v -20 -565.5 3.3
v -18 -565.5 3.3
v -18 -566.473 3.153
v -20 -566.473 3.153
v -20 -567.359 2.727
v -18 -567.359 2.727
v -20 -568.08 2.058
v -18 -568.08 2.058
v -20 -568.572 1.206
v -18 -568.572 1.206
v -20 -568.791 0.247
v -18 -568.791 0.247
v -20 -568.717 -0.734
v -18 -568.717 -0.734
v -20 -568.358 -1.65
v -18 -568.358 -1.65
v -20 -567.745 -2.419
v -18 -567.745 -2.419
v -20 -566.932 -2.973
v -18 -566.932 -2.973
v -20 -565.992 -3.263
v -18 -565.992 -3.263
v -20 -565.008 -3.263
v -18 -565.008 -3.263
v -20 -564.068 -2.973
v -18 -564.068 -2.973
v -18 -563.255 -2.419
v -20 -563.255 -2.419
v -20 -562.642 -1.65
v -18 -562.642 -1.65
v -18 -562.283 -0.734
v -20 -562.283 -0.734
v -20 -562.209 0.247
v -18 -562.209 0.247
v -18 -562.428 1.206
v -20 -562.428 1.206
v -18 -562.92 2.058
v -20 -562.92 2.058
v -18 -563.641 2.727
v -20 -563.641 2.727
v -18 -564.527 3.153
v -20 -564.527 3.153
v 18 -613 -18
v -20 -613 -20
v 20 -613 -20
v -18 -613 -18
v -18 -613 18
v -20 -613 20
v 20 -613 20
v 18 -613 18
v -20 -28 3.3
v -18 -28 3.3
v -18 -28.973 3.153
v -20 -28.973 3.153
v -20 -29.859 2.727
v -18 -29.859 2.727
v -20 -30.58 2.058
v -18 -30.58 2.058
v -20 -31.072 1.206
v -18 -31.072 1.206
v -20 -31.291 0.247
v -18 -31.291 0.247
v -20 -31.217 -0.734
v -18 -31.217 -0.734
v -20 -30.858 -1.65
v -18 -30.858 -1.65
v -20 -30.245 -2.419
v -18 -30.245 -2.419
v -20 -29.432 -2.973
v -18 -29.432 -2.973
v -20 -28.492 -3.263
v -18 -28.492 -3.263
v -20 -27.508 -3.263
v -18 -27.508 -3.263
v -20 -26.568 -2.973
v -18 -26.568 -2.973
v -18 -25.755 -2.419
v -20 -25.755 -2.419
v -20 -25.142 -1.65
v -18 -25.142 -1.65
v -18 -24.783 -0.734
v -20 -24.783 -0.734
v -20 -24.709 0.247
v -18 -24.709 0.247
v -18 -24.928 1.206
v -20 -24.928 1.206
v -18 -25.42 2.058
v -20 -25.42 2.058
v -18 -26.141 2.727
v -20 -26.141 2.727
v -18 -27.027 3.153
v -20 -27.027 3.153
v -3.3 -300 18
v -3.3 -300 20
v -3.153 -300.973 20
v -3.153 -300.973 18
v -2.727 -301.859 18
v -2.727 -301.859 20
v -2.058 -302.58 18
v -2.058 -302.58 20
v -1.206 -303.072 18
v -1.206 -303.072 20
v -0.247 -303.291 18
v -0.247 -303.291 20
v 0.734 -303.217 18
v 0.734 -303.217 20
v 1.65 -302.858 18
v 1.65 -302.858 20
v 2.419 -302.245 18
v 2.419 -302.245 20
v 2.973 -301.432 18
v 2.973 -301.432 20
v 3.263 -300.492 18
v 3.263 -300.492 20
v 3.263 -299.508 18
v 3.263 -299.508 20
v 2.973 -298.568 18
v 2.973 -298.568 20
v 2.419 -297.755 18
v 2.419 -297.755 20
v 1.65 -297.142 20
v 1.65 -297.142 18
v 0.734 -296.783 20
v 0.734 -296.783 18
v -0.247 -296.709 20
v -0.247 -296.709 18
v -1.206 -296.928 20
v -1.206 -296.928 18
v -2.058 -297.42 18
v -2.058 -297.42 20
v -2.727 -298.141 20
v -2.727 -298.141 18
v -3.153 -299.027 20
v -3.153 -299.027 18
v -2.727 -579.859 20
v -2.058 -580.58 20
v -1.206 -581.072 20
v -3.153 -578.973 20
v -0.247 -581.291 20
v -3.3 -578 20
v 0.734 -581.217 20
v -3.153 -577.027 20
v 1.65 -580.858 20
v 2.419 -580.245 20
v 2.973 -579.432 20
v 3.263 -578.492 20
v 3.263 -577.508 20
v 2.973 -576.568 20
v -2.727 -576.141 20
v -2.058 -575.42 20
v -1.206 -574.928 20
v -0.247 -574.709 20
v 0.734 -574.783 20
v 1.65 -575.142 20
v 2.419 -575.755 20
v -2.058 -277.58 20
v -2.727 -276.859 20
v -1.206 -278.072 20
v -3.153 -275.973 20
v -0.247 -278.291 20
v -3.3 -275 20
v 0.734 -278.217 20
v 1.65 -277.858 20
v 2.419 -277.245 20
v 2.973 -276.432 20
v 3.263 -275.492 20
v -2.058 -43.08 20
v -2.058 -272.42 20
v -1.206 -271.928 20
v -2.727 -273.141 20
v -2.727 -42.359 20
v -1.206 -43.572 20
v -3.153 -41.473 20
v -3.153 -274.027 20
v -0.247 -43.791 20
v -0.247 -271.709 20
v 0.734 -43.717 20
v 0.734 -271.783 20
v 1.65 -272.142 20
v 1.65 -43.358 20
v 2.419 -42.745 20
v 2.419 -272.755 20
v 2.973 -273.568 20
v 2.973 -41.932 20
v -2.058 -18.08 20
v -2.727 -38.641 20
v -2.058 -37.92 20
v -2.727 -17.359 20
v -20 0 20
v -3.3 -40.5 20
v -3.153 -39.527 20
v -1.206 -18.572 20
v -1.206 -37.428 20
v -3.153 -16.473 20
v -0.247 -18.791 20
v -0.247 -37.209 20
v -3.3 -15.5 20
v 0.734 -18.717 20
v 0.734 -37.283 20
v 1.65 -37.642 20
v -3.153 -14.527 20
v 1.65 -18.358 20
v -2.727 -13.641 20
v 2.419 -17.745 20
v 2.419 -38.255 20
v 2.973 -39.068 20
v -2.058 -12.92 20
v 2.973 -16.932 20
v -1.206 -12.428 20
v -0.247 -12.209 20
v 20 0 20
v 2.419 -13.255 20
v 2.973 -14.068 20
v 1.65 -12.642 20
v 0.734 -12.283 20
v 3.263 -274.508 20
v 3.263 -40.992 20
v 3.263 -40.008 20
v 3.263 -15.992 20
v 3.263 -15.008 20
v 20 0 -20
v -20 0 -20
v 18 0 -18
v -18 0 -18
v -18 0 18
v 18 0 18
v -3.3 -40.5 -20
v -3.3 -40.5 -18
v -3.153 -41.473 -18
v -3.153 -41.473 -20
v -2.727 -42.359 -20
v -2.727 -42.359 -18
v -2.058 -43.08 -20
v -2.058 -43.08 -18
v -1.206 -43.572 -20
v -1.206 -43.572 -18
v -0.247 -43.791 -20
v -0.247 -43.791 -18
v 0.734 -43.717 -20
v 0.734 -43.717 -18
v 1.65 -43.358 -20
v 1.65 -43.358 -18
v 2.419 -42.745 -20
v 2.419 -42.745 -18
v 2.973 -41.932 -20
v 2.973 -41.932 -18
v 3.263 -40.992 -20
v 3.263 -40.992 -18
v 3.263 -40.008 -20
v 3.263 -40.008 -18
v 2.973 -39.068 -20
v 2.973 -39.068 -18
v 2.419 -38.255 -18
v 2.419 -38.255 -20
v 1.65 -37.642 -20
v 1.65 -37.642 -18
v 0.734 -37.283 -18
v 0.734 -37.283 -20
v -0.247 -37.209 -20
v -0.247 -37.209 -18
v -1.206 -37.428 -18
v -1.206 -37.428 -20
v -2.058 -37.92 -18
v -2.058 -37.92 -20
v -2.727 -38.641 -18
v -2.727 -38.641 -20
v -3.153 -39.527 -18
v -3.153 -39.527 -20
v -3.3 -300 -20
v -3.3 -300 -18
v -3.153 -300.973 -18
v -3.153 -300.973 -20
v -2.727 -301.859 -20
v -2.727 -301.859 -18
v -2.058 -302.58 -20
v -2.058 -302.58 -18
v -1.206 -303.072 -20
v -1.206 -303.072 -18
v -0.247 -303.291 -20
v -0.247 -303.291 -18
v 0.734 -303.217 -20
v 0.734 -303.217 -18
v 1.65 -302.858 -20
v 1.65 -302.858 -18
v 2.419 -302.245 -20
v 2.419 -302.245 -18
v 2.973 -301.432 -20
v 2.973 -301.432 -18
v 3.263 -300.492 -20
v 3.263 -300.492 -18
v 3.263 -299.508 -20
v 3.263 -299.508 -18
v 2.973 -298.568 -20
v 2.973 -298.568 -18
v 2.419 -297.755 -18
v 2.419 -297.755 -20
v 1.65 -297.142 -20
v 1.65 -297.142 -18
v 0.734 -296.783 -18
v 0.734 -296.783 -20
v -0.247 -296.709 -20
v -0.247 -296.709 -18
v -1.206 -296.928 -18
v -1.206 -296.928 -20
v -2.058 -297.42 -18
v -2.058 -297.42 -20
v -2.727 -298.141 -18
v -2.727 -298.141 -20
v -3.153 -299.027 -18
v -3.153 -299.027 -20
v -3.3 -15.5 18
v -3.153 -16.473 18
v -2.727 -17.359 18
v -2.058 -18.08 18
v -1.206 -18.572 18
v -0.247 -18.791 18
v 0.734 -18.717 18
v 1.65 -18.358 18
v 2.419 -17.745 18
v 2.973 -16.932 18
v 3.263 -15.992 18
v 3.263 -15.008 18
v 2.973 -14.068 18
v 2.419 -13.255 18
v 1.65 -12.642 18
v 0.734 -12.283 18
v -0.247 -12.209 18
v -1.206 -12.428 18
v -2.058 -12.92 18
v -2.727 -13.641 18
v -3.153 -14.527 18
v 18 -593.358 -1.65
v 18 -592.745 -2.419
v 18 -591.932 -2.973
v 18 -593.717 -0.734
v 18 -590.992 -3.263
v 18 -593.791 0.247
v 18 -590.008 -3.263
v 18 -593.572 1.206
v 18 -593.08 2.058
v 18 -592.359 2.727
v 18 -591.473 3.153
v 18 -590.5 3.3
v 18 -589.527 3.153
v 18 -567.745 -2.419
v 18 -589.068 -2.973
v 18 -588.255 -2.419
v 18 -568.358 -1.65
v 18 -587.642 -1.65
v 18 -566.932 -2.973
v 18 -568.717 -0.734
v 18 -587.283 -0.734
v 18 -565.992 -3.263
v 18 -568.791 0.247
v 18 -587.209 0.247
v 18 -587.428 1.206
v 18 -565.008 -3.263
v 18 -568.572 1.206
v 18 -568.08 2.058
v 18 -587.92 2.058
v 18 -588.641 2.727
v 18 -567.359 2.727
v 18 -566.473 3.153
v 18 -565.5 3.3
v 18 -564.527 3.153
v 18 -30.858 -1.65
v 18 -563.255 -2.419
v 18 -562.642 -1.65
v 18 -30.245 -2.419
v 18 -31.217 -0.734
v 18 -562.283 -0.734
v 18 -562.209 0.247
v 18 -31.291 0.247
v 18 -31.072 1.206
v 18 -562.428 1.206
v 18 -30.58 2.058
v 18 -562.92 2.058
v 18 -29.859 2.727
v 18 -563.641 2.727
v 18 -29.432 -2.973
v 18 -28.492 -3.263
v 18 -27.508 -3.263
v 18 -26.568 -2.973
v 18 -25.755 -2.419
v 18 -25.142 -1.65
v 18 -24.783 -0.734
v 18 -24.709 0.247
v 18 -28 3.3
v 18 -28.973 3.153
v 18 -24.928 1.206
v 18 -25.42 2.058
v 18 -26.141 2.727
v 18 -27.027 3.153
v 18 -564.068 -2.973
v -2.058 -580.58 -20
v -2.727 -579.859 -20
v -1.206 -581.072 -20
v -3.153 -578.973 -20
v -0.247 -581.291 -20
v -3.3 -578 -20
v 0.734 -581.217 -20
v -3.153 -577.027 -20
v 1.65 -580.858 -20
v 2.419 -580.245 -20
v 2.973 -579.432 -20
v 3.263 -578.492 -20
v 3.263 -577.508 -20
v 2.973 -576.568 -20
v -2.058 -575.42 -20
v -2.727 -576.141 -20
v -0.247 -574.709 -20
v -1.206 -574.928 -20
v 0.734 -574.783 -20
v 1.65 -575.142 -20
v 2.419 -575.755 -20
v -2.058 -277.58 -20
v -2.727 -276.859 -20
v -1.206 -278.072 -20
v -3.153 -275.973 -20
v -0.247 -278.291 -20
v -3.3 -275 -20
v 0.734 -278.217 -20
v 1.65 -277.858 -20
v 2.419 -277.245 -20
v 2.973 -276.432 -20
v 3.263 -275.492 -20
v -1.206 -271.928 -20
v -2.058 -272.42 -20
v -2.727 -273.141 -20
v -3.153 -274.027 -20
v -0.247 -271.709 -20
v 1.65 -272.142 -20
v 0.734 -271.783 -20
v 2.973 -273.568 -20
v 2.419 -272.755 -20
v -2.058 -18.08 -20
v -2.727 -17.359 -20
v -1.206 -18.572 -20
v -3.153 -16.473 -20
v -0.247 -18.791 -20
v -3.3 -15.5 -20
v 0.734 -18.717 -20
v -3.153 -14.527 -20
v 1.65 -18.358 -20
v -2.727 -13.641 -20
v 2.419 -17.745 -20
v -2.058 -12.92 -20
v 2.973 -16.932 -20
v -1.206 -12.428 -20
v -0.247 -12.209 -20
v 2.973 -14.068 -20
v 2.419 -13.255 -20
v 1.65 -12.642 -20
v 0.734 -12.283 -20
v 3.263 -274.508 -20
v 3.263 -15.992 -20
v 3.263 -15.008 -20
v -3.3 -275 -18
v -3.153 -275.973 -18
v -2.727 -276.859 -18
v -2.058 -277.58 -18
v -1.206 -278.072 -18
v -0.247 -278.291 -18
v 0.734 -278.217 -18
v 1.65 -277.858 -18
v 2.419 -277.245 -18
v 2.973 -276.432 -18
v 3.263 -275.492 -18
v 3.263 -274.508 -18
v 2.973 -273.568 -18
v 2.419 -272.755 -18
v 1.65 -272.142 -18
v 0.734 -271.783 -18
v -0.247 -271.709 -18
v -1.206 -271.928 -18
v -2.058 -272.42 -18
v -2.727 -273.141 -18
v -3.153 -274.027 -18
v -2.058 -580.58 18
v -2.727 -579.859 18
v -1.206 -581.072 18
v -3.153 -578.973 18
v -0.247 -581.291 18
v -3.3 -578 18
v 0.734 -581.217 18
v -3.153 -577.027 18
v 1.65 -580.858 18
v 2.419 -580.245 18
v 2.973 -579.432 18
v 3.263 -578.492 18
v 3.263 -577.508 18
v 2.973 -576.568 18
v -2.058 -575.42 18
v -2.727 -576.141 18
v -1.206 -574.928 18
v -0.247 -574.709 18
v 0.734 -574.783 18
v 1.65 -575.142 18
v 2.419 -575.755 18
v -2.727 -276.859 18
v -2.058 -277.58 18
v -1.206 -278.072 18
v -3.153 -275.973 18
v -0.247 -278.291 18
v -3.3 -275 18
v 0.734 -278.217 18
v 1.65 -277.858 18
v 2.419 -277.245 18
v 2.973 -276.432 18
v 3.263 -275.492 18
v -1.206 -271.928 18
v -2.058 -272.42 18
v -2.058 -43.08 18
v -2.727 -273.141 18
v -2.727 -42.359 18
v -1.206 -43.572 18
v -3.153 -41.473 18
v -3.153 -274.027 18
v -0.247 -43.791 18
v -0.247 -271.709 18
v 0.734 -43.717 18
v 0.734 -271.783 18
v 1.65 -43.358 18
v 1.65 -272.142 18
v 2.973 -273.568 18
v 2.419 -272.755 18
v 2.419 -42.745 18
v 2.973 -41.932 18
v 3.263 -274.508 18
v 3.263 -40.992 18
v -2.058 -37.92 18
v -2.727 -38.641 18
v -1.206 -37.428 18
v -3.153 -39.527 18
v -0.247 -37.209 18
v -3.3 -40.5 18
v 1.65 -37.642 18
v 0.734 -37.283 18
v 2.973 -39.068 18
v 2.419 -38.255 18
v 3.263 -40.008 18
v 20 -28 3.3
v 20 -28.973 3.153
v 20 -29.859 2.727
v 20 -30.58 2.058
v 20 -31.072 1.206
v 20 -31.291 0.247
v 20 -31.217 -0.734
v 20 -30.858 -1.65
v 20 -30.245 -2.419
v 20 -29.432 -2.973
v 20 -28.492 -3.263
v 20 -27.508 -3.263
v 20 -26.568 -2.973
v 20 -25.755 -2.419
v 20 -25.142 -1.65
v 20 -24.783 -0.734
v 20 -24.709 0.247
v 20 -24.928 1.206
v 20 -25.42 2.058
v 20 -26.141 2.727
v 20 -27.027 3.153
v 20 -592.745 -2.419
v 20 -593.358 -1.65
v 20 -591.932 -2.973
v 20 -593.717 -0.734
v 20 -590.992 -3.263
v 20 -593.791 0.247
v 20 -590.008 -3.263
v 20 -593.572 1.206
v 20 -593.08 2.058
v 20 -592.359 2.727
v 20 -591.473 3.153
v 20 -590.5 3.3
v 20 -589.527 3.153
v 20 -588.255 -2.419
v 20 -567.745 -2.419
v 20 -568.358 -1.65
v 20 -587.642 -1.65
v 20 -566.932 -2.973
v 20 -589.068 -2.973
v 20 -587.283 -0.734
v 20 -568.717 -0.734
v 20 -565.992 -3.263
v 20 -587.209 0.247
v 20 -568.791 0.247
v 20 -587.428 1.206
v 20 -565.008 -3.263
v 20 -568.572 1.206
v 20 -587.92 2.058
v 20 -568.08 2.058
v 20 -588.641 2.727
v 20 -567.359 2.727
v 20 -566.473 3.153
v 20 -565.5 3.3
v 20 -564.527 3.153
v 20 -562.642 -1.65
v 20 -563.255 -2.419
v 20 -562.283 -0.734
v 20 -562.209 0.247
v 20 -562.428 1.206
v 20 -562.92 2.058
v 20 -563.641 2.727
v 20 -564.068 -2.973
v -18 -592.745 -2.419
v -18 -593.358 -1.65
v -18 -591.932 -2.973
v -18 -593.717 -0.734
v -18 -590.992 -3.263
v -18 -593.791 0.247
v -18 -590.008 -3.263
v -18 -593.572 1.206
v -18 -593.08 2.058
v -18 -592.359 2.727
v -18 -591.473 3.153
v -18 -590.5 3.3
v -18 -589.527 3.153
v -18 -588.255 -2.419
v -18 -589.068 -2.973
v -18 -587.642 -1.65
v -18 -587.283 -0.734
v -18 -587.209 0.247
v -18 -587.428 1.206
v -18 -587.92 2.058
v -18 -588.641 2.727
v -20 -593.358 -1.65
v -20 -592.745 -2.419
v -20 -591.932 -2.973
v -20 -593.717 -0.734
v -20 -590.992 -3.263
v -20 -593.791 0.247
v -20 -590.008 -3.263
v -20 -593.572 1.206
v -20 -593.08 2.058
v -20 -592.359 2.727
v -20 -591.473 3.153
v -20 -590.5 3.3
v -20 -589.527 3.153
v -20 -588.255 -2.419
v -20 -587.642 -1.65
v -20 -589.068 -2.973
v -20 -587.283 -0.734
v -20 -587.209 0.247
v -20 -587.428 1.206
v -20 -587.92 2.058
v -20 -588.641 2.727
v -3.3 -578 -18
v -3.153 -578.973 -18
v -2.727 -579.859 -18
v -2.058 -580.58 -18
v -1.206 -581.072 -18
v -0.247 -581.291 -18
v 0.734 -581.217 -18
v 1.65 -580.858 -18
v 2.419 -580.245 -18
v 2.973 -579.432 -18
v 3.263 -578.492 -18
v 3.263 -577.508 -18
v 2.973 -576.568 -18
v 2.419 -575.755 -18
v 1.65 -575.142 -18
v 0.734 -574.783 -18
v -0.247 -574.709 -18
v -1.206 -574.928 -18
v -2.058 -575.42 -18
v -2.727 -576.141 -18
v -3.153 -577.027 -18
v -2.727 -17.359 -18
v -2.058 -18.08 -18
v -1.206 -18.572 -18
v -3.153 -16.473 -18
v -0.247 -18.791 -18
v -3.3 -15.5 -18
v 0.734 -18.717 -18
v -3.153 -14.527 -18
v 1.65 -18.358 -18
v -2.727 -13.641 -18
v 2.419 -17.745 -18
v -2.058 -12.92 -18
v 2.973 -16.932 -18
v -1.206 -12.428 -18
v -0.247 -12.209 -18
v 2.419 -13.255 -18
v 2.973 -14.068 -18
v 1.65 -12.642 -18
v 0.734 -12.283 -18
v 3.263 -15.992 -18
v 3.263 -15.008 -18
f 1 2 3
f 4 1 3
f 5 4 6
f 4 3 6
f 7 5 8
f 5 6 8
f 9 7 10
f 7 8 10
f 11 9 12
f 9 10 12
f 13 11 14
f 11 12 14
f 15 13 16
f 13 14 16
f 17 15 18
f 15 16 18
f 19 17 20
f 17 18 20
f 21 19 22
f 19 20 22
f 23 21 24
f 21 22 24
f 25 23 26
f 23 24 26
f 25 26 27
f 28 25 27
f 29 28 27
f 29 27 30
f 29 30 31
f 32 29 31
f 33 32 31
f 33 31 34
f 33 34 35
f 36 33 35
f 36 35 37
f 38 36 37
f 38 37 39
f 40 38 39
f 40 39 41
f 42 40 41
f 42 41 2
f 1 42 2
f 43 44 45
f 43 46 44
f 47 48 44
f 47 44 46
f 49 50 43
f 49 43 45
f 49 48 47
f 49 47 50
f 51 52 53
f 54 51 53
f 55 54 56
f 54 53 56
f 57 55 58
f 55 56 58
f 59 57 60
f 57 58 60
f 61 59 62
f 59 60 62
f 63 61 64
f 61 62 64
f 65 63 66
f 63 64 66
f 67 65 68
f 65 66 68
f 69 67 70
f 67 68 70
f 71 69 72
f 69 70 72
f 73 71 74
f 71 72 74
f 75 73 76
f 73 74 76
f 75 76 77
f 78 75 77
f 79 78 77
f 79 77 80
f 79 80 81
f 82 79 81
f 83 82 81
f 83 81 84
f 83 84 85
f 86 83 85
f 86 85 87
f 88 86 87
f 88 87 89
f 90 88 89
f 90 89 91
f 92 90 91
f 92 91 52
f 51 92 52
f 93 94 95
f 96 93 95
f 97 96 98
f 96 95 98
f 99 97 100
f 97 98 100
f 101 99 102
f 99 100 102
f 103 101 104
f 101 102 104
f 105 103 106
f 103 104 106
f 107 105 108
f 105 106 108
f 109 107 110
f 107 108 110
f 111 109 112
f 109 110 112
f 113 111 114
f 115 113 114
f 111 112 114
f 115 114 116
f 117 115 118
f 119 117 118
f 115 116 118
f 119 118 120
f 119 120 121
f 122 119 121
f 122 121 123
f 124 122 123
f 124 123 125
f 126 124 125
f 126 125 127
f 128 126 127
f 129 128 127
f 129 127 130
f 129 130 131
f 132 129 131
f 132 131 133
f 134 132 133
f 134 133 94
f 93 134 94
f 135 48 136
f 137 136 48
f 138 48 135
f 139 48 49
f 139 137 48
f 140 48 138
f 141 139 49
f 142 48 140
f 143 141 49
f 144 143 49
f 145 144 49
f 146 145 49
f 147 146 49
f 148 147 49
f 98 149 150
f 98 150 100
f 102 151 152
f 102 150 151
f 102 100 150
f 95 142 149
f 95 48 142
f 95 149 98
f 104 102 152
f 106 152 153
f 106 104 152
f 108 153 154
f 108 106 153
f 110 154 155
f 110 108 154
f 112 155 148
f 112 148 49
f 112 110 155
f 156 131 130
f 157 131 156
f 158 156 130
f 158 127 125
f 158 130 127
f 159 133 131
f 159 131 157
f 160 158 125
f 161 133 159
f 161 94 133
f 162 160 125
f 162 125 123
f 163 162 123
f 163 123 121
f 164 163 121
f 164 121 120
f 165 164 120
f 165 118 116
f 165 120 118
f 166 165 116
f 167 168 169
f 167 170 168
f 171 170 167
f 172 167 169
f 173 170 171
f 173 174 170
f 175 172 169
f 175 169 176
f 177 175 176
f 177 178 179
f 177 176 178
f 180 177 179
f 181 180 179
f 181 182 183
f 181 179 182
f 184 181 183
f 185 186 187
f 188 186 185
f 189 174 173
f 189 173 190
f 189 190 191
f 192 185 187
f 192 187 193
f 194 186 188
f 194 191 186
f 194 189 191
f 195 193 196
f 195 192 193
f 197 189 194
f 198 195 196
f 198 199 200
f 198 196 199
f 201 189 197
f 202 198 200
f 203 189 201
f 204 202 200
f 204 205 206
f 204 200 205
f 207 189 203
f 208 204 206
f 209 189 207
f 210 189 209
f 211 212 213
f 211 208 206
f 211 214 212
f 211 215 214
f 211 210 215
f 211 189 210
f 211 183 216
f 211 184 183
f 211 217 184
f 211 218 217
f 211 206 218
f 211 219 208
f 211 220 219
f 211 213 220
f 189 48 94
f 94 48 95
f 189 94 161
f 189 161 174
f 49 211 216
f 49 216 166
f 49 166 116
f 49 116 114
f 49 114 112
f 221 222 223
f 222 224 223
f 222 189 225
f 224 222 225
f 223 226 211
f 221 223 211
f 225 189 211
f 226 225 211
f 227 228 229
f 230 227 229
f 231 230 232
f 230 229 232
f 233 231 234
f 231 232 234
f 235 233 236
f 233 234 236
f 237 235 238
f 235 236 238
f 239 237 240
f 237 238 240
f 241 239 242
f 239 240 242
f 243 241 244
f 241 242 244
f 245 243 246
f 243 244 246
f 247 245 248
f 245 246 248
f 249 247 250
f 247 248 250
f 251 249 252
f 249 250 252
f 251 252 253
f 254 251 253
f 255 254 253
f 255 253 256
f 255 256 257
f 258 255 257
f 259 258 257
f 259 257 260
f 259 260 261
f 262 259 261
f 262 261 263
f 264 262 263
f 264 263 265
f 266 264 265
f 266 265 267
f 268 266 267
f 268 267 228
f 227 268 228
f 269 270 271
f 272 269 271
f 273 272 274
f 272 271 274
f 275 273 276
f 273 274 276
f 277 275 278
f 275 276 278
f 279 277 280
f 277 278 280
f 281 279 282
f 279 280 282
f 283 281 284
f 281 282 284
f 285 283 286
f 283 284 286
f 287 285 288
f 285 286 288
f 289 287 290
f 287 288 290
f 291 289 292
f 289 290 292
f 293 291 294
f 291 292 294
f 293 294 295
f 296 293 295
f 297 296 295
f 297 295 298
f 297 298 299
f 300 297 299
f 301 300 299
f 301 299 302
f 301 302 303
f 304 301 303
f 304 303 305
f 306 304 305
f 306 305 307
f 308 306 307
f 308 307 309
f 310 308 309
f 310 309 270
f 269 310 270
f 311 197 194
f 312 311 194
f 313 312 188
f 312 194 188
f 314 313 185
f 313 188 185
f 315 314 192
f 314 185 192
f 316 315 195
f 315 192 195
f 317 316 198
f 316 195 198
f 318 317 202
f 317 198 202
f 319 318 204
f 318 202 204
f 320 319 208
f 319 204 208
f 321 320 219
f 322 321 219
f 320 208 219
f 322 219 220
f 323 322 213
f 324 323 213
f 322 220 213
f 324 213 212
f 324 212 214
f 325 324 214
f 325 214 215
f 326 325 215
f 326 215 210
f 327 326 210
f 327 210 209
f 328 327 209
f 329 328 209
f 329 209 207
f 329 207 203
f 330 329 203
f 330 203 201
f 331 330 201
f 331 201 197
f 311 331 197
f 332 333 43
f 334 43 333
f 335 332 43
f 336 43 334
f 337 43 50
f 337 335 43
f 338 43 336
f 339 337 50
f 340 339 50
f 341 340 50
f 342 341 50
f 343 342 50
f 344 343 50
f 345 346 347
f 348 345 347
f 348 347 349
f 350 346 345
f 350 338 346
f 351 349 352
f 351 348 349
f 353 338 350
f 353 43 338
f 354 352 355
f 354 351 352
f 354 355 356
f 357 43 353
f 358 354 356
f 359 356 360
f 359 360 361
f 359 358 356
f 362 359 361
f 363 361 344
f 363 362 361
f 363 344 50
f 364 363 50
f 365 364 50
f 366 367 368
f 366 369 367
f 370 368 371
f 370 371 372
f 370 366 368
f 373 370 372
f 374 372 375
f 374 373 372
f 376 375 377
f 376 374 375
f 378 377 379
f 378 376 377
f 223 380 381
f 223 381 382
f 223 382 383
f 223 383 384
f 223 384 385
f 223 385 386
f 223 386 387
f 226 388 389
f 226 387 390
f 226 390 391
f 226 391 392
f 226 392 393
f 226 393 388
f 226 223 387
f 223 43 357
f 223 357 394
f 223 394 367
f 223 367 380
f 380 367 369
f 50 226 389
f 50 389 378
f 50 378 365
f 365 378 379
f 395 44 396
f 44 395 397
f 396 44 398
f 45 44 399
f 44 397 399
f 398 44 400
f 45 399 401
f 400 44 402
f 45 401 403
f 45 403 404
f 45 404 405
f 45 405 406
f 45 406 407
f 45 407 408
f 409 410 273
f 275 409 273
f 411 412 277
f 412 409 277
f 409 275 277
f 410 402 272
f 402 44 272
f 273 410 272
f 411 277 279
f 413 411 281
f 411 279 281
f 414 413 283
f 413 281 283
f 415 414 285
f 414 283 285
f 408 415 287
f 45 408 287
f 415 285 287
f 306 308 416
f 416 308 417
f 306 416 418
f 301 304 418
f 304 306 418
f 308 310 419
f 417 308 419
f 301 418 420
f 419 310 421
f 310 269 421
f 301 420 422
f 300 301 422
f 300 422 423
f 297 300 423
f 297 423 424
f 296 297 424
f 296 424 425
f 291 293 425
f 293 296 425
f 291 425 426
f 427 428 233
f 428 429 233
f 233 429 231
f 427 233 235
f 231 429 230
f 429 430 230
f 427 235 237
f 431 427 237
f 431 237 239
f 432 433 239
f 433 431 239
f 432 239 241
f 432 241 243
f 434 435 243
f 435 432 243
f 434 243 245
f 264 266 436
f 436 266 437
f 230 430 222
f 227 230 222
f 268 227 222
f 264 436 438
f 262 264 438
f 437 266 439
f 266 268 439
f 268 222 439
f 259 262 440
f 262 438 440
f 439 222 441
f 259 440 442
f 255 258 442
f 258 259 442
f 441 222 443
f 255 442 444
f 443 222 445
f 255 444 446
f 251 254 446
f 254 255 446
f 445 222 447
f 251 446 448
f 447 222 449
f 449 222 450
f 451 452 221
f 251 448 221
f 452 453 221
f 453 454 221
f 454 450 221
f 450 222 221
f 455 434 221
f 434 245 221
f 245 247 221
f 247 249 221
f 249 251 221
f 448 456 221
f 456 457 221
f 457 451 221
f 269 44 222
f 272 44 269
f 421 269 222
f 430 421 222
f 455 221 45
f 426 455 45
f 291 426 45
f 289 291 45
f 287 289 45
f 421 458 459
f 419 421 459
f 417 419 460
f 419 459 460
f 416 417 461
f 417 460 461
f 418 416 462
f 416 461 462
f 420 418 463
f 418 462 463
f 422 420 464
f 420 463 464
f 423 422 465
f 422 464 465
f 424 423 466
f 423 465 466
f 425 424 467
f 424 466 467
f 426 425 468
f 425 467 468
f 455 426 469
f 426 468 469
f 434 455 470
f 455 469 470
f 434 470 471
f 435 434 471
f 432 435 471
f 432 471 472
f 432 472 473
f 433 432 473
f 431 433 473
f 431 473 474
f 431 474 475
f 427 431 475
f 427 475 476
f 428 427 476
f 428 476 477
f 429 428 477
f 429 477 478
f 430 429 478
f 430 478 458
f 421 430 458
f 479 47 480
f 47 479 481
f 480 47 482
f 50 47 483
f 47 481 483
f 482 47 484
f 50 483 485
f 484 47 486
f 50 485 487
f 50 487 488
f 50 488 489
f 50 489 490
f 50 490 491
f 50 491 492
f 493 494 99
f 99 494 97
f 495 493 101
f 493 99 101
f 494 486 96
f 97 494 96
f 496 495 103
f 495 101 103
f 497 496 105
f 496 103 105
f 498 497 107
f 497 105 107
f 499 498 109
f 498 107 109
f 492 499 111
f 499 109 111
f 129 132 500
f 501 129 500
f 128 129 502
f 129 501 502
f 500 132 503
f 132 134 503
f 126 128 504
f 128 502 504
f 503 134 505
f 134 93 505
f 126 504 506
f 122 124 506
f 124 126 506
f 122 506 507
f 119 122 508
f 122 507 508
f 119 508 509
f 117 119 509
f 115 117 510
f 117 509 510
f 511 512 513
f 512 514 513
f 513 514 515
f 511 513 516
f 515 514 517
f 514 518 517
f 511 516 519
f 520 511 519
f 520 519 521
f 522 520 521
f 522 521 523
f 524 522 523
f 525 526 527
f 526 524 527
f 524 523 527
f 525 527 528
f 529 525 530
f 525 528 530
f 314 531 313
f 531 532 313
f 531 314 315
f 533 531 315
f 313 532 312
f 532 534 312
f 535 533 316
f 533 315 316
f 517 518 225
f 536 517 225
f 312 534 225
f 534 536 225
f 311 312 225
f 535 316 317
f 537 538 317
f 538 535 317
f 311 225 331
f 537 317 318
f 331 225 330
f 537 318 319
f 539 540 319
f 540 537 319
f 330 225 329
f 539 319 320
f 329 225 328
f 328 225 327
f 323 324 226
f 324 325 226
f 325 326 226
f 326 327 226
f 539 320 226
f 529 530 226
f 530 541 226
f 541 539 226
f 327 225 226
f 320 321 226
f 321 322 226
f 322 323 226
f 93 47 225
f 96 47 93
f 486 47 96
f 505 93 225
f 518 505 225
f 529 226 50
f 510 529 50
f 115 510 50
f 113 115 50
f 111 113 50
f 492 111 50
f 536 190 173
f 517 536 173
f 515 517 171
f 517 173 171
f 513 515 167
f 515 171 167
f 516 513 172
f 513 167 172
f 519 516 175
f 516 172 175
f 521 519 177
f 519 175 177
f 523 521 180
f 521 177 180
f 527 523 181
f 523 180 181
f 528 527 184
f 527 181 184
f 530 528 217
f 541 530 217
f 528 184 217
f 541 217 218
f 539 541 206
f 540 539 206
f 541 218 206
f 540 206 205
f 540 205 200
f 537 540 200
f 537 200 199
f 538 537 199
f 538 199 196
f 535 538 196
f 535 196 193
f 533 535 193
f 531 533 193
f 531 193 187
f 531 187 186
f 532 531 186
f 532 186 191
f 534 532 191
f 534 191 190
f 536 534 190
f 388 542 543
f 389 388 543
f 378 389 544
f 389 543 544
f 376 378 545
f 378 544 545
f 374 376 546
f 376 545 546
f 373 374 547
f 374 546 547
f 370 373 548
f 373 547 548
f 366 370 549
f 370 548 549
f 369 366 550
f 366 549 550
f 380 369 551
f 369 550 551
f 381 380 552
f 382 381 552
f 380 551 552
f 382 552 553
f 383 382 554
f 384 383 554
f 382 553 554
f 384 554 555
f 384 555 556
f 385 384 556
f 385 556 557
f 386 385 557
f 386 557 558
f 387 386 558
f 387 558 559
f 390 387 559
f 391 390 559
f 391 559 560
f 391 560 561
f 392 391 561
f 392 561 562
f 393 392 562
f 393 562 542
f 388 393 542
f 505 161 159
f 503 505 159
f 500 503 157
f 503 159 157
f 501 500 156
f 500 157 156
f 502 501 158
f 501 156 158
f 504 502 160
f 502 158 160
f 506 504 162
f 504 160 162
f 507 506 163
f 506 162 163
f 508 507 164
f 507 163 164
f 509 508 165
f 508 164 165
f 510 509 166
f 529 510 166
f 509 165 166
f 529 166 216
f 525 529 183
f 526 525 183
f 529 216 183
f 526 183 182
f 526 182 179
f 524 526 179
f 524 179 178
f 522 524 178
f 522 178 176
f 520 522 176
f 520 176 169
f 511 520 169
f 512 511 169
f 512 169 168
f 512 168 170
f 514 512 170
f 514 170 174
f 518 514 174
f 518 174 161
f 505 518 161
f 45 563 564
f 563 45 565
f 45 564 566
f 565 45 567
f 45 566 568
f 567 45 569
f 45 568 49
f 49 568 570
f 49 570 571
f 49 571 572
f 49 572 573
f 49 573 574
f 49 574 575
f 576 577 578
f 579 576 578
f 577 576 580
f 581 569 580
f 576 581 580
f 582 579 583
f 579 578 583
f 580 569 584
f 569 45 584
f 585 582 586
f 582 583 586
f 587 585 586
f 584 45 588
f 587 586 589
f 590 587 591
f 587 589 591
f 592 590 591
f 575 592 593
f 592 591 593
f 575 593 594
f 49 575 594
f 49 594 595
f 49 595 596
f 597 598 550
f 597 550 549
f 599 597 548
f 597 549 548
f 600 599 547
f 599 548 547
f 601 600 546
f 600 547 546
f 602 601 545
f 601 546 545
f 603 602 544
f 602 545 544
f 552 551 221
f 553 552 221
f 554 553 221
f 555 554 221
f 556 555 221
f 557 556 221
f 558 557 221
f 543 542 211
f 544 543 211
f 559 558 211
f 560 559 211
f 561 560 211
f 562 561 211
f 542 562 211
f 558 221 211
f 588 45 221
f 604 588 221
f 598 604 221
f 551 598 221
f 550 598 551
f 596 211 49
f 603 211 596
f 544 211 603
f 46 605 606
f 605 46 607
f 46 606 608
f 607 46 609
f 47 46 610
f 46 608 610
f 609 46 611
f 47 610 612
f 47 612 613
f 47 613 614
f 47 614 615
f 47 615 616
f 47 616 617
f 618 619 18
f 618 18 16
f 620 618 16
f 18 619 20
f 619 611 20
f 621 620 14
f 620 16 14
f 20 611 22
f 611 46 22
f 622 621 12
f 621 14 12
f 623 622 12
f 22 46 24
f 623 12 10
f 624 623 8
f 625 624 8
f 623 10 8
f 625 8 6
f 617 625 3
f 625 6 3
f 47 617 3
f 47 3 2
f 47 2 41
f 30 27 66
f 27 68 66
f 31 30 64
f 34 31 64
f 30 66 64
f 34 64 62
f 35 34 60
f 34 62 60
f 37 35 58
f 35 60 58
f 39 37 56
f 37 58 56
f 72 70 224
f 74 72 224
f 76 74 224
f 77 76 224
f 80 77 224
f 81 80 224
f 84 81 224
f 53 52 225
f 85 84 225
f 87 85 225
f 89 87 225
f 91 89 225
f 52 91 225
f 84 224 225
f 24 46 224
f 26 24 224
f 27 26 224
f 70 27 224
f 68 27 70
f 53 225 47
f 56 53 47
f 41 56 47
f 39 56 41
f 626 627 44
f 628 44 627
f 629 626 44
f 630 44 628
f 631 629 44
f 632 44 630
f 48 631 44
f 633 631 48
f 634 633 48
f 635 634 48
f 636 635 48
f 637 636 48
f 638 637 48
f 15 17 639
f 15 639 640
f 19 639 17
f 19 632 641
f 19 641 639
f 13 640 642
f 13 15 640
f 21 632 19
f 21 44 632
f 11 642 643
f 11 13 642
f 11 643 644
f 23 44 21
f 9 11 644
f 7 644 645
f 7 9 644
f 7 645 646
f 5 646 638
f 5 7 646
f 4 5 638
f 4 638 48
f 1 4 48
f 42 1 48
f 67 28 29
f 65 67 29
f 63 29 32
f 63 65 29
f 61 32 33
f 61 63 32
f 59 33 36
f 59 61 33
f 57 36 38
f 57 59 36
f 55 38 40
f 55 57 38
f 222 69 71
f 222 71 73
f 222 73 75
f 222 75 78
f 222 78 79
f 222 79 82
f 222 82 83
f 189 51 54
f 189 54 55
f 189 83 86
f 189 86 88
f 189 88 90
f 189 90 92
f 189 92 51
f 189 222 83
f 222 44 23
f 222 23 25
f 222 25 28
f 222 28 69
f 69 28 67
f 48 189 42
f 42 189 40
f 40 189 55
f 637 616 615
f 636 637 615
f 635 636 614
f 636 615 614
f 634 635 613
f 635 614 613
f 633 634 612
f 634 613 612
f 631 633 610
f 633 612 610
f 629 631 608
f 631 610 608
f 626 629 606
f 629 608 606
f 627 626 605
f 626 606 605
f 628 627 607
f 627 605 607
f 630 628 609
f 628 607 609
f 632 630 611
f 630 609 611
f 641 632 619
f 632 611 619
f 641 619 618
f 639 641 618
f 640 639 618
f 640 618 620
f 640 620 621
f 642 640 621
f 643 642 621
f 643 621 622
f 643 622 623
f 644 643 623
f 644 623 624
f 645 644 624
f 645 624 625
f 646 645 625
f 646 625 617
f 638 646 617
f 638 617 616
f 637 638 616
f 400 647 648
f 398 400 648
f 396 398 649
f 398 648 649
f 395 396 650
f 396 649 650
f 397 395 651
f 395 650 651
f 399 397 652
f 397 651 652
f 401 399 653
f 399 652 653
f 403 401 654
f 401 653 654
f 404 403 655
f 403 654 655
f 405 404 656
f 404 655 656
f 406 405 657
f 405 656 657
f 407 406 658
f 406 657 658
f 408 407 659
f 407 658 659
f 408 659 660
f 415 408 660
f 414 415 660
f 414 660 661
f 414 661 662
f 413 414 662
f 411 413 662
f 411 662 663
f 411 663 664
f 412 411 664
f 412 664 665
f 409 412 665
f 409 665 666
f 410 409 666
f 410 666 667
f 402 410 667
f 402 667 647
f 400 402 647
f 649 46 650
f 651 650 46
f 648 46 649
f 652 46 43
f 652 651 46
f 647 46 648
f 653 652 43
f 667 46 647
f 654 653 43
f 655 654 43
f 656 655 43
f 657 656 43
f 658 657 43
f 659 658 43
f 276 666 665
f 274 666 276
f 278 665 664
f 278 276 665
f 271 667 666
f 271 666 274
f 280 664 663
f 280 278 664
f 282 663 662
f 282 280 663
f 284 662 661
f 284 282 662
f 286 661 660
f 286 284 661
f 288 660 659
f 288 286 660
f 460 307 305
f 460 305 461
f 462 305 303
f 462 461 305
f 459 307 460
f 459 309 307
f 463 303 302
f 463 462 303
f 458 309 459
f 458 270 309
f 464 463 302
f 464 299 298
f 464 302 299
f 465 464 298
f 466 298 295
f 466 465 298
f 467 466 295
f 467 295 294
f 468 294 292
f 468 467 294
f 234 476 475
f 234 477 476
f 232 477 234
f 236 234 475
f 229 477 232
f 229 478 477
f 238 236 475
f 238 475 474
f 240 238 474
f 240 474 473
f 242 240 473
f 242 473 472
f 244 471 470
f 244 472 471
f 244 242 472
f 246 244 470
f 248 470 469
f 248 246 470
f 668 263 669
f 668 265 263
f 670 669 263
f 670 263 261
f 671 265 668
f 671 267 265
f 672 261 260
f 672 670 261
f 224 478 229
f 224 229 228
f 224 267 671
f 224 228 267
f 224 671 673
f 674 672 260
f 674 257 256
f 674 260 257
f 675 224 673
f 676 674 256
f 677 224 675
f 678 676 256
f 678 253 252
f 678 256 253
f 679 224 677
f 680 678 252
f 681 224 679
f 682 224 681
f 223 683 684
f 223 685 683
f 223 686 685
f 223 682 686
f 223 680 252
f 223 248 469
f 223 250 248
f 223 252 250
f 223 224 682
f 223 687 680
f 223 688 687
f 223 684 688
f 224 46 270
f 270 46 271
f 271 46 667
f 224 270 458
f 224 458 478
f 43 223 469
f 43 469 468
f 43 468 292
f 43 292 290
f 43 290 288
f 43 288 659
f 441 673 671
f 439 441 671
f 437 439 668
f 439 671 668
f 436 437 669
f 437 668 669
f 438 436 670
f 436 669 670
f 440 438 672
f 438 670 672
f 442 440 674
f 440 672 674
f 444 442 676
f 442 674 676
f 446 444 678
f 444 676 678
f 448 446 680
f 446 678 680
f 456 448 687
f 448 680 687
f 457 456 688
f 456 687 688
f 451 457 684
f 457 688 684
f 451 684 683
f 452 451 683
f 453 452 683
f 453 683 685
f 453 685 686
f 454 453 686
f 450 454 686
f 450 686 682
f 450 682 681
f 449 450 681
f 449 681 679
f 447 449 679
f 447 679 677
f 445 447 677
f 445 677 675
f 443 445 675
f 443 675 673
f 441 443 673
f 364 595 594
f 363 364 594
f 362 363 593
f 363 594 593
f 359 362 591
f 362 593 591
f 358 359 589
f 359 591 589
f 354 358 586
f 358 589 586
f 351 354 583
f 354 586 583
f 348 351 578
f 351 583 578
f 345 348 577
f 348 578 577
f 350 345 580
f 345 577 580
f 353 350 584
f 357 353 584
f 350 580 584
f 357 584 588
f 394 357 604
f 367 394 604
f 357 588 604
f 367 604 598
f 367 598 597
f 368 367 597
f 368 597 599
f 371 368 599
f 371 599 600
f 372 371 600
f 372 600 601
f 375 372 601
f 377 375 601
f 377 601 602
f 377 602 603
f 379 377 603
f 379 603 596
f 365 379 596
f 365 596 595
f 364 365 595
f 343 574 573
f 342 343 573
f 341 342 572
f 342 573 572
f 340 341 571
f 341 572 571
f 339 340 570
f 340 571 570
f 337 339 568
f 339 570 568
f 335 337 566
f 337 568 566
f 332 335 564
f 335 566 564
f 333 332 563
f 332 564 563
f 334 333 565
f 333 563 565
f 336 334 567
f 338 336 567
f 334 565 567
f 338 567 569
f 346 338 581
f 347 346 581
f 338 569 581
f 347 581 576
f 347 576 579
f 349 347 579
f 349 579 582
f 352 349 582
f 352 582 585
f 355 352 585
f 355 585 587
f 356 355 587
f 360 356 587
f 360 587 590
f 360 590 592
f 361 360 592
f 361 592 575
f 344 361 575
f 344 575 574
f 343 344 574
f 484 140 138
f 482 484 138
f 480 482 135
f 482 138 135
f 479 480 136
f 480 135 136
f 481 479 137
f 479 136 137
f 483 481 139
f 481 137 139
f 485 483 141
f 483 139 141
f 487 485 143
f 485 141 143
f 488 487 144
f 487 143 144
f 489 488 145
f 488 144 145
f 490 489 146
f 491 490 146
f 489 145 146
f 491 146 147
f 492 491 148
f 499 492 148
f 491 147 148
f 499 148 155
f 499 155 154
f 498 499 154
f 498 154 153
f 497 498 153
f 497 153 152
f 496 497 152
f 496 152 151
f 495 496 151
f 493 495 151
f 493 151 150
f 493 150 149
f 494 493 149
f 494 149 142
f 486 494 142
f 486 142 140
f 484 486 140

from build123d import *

# Parameters (mm, degrees)
SKETCH_W      = 40
SKETCH_H      = 40
SKETCH_W_2    = 36
SKETCH_H_2    = 36
PAD_DEPTH     = 613
SKETCH001_R   = 3.3
HOLE_DEPTH    = 40.001
SKETCH002_R   = 3.3
HOLE001_DEPTH = 40.001


with BuildPart() as part:
    # Sketch → Pad (new body)
    with BuildSketch(Plane.XZ):
        Rectangle(SKETCH_W, SKETCH_H)
        Rectangle(SKETCH_W_2, SKETCH_H_2, mode=Mode.SUBTRACT)
    extrude(amount=PAD_DEPTH)

    # Sketch001 → Hole (cut, through all)
    with BuildSketch(Plane(origin=(20, 0, 0), x_dir=(0, 0, 1), z_dir=(1, 0, 0))):
        with Locations((0, 28)):
            Circle(SKETCH001_R)
        with Locations((0, 565.5)):
            Circle(SKETCH001_R)
        with Locations((0, 590.5)):
            Circle(SKETCH001_R)
    extrude(amount=-HOLE_DEPTH, mode=Mode.SUBTRACT)

    # Sketch002 → Hole001 (cut, through all)
    with BuildSketch(Plane(origin=(0, 0, 20), x_dir=(-1, 0, 0), z_dir=(0, 0, 1))):
        with Locations((0, 15.5)):
            Circle(SKETCH002_R)
        with Locations((0, 300)):
            Circle(SKETCH002_R)
        with Locations((0, 275)):
            Circle(SKETCH002_R)
        with Locations((0, 578)):
            Circle(SKETCH002_R)
        with Locations((0, 40.5)):
            Circle(SKETCH002_R)
    extrude(amount=-HOLE001_DEPTH, mode=Mode.SUBTRACT)


solid = part.part
